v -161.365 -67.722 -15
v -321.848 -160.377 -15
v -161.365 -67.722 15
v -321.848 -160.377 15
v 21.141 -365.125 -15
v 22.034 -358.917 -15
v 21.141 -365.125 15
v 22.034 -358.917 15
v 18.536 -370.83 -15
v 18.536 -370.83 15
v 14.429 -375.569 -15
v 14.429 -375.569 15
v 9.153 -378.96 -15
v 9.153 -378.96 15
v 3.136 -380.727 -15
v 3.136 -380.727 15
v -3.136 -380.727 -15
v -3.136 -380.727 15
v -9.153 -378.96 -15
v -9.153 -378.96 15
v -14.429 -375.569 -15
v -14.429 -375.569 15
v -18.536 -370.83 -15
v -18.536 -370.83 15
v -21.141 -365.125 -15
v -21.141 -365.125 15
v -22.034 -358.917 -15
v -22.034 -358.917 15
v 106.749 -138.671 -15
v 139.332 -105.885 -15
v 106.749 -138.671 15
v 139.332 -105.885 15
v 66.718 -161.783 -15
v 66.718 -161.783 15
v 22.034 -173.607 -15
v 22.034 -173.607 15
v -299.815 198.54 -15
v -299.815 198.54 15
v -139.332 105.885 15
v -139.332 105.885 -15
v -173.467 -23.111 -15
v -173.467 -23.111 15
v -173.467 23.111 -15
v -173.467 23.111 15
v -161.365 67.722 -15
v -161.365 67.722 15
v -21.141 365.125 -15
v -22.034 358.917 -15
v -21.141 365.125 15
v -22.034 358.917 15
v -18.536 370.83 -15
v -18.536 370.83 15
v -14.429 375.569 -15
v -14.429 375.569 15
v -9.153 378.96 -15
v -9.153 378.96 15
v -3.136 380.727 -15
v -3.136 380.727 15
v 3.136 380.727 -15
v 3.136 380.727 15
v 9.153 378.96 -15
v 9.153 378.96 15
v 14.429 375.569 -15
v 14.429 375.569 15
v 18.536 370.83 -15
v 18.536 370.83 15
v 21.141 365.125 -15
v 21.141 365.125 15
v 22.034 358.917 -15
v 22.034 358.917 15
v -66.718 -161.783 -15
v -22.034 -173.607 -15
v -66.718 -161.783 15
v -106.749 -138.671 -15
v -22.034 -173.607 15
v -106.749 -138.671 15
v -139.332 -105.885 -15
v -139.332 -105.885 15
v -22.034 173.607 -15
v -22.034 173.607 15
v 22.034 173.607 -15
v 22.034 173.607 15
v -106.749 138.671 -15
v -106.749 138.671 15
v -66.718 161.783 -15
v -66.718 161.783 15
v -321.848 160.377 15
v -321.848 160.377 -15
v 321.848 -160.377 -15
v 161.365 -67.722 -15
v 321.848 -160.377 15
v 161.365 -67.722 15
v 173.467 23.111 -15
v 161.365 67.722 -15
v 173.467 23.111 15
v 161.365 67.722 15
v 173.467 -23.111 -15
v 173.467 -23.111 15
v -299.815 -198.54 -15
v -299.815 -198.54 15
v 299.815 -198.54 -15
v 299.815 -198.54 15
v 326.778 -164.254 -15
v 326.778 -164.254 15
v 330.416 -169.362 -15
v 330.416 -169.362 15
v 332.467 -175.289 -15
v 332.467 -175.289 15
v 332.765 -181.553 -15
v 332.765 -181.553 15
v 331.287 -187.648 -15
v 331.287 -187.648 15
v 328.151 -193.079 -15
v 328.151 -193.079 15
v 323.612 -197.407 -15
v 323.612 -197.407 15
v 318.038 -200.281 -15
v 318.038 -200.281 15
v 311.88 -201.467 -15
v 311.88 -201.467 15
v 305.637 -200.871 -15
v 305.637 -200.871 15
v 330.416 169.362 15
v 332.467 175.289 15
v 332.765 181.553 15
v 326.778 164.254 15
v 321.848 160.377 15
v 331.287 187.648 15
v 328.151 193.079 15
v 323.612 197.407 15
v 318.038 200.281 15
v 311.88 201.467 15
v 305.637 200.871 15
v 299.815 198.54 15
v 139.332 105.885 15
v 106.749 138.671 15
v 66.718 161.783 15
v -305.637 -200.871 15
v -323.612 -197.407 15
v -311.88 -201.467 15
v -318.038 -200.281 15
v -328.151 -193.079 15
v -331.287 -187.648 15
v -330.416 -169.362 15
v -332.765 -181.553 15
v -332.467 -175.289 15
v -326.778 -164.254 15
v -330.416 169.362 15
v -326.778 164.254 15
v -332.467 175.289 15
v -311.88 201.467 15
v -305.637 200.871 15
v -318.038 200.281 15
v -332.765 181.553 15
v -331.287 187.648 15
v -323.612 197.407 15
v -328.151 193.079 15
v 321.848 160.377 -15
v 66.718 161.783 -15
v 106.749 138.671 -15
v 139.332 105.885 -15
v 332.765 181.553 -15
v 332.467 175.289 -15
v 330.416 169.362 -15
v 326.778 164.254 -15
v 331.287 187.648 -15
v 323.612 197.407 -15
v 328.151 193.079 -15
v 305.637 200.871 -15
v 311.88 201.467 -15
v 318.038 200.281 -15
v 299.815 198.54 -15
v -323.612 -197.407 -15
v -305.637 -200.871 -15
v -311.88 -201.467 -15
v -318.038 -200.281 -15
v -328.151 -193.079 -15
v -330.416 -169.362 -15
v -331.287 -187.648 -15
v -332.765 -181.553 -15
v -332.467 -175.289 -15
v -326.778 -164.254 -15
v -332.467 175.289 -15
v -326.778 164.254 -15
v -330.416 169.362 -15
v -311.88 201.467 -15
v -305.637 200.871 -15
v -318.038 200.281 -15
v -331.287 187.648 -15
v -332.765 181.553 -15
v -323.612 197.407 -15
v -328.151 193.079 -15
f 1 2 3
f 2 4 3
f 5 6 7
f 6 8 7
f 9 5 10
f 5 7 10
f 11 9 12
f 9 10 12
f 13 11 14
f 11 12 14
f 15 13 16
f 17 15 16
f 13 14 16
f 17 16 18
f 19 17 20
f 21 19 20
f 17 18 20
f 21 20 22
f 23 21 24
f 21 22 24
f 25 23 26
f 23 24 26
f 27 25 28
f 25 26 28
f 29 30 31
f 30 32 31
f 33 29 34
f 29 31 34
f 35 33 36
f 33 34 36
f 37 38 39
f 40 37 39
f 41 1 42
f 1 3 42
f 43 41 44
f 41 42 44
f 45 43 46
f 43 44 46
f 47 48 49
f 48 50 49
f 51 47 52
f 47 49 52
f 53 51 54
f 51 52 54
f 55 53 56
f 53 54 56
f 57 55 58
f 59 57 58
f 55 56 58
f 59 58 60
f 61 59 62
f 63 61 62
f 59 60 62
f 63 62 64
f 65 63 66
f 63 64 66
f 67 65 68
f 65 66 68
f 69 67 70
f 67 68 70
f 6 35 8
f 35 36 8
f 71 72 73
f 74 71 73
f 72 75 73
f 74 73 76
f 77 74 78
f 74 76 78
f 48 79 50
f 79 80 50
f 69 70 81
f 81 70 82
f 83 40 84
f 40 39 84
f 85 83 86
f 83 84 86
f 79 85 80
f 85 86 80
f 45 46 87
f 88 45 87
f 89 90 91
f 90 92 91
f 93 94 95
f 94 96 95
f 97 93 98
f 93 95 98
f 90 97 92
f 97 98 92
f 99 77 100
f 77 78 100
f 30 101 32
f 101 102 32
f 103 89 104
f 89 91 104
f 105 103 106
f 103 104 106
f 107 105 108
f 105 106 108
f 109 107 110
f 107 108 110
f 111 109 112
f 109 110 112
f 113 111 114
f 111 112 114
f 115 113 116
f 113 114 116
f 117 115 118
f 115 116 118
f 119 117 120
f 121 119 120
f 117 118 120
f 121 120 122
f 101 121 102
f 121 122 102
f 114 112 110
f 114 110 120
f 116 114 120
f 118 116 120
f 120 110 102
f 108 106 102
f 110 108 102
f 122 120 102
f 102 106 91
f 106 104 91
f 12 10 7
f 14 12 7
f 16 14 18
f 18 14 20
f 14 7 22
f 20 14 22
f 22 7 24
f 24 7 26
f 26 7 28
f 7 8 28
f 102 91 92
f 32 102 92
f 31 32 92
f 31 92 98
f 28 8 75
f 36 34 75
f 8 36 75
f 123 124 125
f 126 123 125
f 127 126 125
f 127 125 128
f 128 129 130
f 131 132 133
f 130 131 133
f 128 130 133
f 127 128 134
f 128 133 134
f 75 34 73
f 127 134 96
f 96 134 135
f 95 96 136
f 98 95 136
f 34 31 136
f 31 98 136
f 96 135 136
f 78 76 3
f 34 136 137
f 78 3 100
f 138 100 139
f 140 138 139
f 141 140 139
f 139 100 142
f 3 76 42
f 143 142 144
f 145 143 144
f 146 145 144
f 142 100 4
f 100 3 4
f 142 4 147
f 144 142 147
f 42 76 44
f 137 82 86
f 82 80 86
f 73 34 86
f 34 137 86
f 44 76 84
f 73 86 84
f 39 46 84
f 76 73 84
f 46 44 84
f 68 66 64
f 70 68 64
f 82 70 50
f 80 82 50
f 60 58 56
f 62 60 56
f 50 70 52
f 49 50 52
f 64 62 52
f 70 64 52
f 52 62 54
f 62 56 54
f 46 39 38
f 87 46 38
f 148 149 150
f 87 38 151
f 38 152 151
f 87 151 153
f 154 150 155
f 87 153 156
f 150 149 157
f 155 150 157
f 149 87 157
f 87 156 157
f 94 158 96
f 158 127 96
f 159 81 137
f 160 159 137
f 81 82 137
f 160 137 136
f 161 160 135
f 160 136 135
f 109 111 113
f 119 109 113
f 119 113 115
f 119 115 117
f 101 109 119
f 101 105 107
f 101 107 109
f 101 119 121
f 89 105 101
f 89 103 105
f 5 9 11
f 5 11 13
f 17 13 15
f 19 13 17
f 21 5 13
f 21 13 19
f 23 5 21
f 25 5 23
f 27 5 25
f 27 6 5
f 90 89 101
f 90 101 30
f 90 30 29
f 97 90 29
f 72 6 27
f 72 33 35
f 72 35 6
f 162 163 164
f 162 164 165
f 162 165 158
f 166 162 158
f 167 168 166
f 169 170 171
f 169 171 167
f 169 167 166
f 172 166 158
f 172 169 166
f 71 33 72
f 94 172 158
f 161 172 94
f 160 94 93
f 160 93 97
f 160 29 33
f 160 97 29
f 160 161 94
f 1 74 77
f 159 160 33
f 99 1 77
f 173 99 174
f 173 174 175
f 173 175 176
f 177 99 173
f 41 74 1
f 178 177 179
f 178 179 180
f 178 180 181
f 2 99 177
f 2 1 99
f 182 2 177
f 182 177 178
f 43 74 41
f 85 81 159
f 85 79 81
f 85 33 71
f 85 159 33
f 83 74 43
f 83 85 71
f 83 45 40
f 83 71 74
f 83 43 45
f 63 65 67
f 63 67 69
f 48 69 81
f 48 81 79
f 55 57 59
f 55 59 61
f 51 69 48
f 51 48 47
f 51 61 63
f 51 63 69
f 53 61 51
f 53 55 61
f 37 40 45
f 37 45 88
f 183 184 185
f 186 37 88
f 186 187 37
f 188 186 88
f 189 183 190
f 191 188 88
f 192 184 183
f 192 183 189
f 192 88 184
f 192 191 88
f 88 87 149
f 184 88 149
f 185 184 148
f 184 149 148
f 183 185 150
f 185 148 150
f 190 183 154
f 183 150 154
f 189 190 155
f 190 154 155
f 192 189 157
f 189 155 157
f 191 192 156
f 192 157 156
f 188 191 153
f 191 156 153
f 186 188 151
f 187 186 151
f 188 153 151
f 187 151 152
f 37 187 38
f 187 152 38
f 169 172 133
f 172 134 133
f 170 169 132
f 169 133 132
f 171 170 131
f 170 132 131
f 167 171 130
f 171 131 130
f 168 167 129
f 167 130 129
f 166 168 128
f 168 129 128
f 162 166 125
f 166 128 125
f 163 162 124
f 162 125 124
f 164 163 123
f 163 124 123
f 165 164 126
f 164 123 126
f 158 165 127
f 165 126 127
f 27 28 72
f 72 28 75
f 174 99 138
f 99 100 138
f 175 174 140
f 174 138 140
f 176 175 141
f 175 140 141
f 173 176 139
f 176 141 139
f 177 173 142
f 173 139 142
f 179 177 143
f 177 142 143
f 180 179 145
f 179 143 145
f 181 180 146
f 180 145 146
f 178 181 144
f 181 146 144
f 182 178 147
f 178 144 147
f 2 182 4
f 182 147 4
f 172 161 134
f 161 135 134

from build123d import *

# Parameters (mm, degrees)
BOSS_EXTRUDE1_DEPTH = 15


with BuildPart() as part:
    # Sketch1 → Boss-Extrude1 (new, symmetric)
    with BuildSketch(Plane.XY):
        with BuildLine():
            Line((-299.814682012, 198.540409756), (-139.331537098, 105.88542284))
            ThreePointArc((-139.331537098, 105.88542284), (-87.5, 151.554445662), (-22.033697521, 173.607362095))
            Line((-22.033697521, 173.607362095), (-22.033697521, 358.917335928))
            ThreePointArc((-22.033697521, 358.917335928), (0, 380.951033449), (22.033697521, 358.917335928))
            Line((22.033697521, 358.917335928), (22.033697521, 173.607362095))
            ThreePointArc((22.033697521, 173.607362095), (87.5, 151.554445662), (139.331537098, 105.88542284))
            Line((139.331537098, 105.88542284), (299.814682012, 198.540409756))
            ThreePointArc((299.814682012, 198.540409756), (329.913272565, 190.475516725), (321.848379533, 160.376926172))
            Line((321.848379533, 160.376926172), (161.365234619, 67.721939255))
            ThreePointArc((161.365234619, 67.721939255), (175, 0), (161.365234619, -67.721939255))
            Line((161.365234619, -67.721939255), (321.848379533, -160.376926172))
            ThreePointArc((321.848379533, -160.376926172), (329.913272565, -190.475516725), (299.814682012, -198.540409756))
            Line((299.814682012, -198.540409756), (139.331537098, -105.88542284))
            ThreePointArc((139.331537098, -105.88542284), (87.5, -151.554445662), (22.033697521, -173.607362095))
            Line((22.033697521, -173.607362095), (22.033697521, -358.917335928))
            ThreePointArc((22.033697521, -358.917335928), (0, -380.951033449), (-22.033697521, -358.917335928))
            Line((-22.033697521, -358.917335928), (-22.033697521, -173.607362095))
            ThreePointArc((-22.033697521, -173.607362095), (-87.5, -151.554445662), (-139.331537098, -105.88542284))
            Line((-139.331537098, -105.88542284), (-299.814682012, -198.540409756))
            ThreePointArc((-299.814682012, -198.540409756), (-329.913272565, -190.475516725), (-321.848379533, -160.376926172))
            Line((-321.848379533, -160.376926172), (-161.365234619, -67.721939255))
            ThreePointArc((-161.365234619, -67.721939255), (-175, 0), (-161.365234619, 67.721939255))
            Line((-161.365234619, 67.721939255), (-321.848379533, 160.376926172))
            ThreePointArc((-321.848379533, 160.376926172), (-329.913272565, 190.475516725), (-299.814682012, 198.540409756))
        make_face()
    extrude(amount=BOSS_EXTRUDE1_DEPTH, both=True)


solid = part.part
